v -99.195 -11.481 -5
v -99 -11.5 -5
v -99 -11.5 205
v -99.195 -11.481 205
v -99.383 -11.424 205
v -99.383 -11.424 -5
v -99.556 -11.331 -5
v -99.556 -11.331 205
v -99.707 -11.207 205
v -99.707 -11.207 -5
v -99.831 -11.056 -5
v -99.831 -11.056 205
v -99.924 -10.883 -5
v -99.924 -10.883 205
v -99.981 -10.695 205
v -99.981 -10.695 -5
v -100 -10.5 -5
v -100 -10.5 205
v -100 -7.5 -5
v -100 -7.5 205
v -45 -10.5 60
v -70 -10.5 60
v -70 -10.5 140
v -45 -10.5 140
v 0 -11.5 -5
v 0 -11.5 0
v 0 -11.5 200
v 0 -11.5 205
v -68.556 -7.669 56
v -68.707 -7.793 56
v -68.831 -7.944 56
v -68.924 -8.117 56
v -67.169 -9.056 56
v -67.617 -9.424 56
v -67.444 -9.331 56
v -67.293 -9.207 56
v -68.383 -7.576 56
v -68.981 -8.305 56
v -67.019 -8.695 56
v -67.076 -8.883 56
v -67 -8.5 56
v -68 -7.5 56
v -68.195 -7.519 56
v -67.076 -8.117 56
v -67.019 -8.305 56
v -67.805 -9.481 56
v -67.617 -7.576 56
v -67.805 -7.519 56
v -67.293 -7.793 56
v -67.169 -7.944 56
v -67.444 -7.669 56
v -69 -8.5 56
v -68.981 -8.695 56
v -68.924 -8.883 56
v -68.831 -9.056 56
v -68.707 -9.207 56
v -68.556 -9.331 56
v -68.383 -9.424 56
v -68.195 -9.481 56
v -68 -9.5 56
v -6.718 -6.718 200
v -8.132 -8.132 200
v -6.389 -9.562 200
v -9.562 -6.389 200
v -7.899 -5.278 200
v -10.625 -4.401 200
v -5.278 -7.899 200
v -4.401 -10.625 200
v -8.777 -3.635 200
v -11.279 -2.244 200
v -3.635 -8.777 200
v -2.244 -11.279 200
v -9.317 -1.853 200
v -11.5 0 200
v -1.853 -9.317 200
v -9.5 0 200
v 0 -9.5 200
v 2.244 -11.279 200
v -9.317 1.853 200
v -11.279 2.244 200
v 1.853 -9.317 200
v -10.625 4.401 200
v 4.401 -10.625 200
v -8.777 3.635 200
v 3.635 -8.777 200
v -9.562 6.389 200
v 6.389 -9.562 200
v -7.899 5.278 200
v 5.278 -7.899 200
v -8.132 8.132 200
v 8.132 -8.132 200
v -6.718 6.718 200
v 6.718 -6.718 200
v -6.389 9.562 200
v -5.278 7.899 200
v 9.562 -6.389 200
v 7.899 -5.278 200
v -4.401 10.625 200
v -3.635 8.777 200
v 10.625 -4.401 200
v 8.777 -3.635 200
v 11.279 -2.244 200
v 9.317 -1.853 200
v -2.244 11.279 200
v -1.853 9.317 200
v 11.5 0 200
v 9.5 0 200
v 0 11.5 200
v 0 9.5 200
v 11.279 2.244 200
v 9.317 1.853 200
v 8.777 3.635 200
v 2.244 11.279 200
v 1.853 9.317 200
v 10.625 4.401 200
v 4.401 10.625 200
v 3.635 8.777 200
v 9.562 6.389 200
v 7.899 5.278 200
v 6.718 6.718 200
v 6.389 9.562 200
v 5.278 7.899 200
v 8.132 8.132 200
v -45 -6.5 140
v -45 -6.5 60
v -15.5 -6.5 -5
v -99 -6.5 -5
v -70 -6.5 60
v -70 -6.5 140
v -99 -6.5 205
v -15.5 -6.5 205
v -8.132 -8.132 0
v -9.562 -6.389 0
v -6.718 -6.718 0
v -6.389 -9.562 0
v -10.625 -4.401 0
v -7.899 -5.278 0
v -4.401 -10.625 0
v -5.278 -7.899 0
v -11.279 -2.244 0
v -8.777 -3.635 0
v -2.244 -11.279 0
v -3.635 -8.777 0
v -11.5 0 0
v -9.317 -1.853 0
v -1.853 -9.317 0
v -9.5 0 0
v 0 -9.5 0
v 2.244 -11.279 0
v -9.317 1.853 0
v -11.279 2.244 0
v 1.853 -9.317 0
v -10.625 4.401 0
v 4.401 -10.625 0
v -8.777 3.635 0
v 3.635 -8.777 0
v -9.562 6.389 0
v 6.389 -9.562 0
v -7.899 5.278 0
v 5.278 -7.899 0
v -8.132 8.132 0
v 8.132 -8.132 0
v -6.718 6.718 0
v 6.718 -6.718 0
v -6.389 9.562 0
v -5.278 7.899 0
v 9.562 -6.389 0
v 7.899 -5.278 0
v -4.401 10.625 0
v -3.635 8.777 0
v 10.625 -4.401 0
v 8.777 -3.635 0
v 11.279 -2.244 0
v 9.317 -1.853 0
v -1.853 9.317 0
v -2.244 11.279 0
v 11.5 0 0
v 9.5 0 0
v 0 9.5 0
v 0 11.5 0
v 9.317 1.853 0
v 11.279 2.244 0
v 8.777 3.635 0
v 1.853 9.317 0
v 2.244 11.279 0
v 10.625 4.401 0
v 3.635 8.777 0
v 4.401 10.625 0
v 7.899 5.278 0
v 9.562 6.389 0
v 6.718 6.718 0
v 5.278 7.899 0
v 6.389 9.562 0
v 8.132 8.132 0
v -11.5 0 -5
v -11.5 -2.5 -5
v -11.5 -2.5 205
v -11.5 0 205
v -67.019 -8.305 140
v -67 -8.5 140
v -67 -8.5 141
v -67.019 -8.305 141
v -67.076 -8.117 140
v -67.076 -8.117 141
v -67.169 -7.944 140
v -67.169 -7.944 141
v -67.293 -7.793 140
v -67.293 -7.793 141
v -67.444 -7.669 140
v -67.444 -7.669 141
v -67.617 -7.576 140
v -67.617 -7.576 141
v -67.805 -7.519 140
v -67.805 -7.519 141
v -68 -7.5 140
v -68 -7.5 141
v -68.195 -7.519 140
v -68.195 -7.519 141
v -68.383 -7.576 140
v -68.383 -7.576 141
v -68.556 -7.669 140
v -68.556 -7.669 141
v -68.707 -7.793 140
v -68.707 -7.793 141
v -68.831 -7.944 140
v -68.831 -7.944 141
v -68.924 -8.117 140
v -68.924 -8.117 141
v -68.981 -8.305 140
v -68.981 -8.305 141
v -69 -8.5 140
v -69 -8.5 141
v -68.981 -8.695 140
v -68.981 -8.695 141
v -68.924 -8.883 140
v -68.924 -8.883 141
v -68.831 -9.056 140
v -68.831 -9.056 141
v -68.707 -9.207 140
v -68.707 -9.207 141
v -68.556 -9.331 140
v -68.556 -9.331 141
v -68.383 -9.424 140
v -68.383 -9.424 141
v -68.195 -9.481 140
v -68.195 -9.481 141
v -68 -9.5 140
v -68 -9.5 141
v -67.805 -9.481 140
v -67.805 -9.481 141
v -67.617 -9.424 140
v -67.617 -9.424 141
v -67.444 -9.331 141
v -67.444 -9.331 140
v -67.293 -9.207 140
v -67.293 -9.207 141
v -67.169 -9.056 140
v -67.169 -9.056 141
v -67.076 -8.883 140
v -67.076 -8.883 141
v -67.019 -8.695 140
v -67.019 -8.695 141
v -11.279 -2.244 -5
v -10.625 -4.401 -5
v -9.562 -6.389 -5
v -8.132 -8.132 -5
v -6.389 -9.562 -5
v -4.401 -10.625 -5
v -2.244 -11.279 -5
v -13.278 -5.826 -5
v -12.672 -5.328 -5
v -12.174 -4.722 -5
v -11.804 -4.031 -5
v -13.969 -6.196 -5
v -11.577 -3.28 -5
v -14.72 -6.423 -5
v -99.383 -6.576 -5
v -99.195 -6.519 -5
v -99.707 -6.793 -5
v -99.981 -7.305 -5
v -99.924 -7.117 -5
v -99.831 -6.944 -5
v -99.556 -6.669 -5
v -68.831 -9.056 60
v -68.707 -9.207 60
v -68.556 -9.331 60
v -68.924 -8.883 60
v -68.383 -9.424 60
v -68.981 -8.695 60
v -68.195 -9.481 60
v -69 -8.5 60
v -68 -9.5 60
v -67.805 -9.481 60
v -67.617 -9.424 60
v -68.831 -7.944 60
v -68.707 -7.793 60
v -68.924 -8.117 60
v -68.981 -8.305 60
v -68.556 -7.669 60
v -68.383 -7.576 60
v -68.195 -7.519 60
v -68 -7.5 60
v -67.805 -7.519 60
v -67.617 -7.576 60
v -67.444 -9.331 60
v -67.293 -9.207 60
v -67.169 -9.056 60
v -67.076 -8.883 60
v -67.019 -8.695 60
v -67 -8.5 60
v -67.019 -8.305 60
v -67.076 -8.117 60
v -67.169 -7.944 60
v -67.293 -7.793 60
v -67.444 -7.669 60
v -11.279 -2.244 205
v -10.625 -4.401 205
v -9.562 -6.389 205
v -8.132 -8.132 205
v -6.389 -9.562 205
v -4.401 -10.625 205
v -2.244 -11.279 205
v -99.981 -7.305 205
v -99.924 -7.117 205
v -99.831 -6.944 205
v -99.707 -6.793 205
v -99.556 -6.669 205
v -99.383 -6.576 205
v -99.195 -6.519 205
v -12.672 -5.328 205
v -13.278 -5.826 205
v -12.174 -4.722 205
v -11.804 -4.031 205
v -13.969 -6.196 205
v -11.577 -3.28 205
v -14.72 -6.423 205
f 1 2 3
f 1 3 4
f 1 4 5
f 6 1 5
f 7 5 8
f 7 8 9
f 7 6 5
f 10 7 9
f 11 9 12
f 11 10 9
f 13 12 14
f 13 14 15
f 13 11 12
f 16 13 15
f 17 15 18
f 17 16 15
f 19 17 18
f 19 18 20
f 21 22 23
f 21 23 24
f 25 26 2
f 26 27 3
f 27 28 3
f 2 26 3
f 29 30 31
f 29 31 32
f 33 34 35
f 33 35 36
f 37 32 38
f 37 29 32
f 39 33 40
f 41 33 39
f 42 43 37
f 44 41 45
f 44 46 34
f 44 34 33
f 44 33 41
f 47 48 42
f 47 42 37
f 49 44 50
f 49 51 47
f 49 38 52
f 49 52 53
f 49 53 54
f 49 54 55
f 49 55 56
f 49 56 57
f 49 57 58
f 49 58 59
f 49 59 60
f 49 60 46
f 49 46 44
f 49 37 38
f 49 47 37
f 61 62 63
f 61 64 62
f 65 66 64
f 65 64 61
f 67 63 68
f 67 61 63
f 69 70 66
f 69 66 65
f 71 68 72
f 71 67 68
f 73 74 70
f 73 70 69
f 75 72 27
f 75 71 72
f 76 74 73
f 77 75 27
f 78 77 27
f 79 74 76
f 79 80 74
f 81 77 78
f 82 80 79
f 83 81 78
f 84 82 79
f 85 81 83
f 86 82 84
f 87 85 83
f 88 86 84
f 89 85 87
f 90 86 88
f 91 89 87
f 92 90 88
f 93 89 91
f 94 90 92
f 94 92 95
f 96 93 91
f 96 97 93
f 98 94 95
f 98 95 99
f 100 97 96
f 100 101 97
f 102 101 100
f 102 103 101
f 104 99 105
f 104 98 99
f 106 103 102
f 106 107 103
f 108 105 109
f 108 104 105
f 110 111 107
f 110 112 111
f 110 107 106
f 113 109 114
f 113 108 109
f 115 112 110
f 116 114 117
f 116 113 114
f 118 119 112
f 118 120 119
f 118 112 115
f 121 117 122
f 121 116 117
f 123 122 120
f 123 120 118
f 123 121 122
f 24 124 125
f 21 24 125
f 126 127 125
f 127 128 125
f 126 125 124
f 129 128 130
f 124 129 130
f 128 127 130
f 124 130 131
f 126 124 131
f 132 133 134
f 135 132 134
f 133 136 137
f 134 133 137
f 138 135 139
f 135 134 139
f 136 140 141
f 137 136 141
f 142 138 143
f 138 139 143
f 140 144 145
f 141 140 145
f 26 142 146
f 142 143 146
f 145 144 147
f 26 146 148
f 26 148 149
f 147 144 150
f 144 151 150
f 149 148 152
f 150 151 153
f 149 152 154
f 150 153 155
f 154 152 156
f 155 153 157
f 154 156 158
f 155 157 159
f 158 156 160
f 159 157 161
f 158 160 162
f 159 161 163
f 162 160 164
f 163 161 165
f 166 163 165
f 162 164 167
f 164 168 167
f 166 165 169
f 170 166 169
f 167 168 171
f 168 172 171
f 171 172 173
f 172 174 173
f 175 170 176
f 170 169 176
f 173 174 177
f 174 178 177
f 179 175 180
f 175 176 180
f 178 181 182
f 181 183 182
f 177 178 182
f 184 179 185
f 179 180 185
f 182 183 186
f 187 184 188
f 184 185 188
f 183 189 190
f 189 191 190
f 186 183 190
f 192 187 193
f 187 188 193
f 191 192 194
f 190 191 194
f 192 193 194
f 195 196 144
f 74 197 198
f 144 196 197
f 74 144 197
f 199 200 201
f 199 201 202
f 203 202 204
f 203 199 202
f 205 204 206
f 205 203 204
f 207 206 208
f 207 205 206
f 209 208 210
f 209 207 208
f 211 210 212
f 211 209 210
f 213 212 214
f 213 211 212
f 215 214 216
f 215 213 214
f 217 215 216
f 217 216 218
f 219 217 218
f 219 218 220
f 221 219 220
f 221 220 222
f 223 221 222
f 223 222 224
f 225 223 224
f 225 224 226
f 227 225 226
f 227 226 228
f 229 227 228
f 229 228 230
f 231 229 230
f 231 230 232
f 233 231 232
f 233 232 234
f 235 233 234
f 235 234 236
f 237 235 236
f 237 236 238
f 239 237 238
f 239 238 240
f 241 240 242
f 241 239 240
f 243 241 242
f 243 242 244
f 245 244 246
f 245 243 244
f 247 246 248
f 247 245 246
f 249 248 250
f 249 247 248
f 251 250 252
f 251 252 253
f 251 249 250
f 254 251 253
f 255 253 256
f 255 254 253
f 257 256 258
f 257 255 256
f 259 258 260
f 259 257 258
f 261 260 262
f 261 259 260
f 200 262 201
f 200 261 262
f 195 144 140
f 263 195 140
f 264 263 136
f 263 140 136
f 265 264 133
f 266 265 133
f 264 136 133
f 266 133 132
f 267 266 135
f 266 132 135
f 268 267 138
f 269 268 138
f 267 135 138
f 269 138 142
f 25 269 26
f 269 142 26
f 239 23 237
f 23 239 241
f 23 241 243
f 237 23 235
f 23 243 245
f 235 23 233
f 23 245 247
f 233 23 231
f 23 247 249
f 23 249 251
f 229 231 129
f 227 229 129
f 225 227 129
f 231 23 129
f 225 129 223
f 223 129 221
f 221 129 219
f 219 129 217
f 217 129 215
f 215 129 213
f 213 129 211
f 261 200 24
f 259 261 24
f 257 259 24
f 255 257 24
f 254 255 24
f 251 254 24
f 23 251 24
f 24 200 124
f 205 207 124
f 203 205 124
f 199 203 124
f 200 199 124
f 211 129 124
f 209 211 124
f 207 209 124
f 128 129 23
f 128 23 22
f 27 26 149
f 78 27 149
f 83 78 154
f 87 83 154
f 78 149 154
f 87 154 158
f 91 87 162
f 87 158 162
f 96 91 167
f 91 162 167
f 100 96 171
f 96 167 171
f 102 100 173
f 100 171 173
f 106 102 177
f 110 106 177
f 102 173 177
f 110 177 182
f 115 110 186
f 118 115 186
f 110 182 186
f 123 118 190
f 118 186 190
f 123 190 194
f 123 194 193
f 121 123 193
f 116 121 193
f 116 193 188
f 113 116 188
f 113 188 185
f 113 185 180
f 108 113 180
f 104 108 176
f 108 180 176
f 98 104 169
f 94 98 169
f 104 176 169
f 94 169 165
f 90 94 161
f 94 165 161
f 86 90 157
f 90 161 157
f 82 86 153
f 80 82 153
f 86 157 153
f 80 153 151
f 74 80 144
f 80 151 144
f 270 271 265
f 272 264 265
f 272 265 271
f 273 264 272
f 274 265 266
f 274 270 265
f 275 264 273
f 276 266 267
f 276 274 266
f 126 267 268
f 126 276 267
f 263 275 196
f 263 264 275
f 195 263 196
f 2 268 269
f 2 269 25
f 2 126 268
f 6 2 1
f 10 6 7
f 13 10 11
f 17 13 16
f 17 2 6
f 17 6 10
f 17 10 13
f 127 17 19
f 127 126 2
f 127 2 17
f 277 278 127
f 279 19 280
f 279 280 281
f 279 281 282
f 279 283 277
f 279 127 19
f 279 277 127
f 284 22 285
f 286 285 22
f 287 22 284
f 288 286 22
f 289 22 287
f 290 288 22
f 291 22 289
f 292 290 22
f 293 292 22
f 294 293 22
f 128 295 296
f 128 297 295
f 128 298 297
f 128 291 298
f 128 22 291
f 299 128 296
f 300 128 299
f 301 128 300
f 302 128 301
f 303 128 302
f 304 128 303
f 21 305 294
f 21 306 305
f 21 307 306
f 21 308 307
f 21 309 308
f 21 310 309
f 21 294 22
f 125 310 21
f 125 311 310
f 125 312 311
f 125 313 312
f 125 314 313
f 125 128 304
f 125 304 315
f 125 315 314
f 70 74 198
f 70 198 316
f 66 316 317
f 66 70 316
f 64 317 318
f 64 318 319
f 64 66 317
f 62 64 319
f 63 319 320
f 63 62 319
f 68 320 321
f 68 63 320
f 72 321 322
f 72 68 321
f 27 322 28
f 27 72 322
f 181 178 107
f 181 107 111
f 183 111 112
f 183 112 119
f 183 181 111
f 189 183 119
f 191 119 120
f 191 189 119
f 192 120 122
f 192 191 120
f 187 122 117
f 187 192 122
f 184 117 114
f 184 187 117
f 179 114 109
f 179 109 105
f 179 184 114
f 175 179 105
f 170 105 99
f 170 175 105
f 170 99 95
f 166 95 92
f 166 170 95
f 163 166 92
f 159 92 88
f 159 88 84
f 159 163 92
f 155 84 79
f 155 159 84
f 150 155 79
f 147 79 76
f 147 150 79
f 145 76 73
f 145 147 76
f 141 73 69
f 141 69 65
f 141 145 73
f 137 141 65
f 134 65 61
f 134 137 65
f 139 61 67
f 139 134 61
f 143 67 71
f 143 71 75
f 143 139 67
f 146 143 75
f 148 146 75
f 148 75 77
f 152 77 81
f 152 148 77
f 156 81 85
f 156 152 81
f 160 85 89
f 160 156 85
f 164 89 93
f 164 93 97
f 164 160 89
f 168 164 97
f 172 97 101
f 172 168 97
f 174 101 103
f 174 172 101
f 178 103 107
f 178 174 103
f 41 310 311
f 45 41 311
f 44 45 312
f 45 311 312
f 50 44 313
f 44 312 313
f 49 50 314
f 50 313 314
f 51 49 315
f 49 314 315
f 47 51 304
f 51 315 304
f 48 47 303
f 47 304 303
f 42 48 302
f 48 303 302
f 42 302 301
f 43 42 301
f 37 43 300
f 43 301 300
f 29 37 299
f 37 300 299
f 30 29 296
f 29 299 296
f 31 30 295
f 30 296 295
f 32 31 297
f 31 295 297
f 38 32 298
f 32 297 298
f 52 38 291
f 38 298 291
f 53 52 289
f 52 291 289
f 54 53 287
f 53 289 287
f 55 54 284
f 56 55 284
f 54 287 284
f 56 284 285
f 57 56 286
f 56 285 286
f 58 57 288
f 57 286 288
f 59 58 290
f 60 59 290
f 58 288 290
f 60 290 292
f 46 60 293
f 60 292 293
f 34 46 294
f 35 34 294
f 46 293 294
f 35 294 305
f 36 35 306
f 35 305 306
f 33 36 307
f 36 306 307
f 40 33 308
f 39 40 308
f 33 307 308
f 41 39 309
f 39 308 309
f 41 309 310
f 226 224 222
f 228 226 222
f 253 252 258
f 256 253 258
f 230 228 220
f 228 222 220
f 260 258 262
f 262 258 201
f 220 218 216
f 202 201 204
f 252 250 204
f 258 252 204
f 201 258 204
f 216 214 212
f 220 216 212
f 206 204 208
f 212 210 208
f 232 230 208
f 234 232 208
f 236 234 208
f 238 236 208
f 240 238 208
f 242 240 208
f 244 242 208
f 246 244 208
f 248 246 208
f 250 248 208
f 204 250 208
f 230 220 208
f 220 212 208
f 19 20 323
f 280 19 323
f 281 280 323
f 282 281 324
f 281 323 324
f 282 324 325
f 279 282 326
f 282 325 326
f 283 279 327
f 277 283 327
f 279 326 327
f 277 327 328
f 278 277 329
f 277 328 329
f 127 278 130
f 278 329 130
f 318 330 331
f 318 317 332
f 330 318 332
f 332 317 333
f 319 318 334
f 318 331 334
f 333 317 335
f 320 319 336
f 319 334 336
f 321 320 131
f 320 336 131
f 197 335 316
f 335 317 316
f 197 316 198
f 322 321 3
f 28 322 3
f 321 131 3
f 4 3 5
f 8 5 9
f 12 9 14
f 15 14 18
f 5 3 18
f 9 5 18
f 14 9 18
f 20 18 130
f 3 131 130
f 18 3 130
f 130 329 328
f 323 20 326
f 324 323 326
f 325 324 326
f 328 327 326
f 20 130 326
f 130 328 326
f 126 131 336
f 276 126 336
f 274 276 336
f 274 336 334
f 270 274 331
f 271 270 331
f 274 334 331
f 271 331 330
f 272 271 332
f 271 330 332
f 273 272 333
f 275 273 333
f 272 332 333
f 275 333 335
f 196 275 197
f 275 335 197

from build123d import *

# Parameters (mm, degrees)
SKETCH_1_R               = 11.5
SKETCH_1_R_2             = 9.5
EXTRUDE_1_DEPTH          = 200
EXTRUDE_2_DEPTH          = 5
EXTRUDE_2_DEPTH_BACK     = 205
SKETCH_3_W               = 25
SKETCH_3_H               = 80
CUT_EXTRUDE_1_DEPTH      = 4
SKETCH_4_R               = 1
CUT_EXTRUDE_2_DEPTH      = 81
CUT_EXTRUDE_2_DEPTH_BACK = 4


with BuildPart() as part:
    # 草图1 → 凸台-拉伸1 (new body)
    with BuildSketch(Plane.XY):
        with BuildLine():
            ThreePointArc((0, -11.5), (-8.131727984, -8.131727984), (-11.5, 0))
            Line((-11.5, 0), (-11.5, -2.5))
            ThreePointArc((-11.5, -2.5), (-12.671572875, -5.328427125), (-15.5, -6.5))
            Line((-15.5, -6.5), (-99, -6.5))
            ThreePointArc((-99, -6.5), (-99.707106781, -6.792893219), (-100, -7.5))
            Line((-100, -7.5), (-100, -10.5))
            ThreePointArc((-100, -10.5), (-99.707106781, -11.207106781), (-99, -11.5))
            Line((-99, -11.5), (0, -11.5))
        make_face()
        Circle(SKETCH_1_R)
        Circle(SKETCH_1_R_2, mode=Mode.SUBTRACT)
    extrude(amount=EXTRUDE_1_DEPTH)

    # 草图2 → 凸台-拉伸2 (add, two sides)
    with BuildSketch(Plane(origin=(0, 0, 0), x_dir=(-1, 0, 0), z_dir=(0, 0, -1))) as extrude_2_sk:
        with BuildLine():
            Line((11.5, -2.5), (11.5, 0))
            ThreePointArc((11.5, 0), (8.131727984, -8.131727984), (0, -11.5))
            Line((0, -11.5), (99, -11.5))
            ThreePointArc((99, -11.5), (99.707106781, -11.207106781), (100, -10.5))
            Line((100, -10.5), (100, -7.5))
            ThreePointArc((100, -7.5), (99.707106781, -6.792893219), (99, -6.5))
            Line((99, -6.5), (15.5, -6.5))
            ThreePointArc((15.5, -6.5), (12.671572875, -5.328427125), (11.5, -2.5))
        make_face()
    extrude(amount=EXTRUDE_2_DEPTH)
    extrude(extrude_2_sk.sketch, amount=-EXTRUDE_2_DEPTH_BACK)

    # 草图3 → 切除-拉伸1 (cut)
    with BuildSketch(Plane(origin=(0, -6.5, 0), x_dir=(1, 0, 0), z_dir=(0, 1, 0))):
        with Locations((-57.5, -100)):
            Rectangle(SKETCH_3_W, SKETCH_3_H)
    extrude(amount=-CUT_EXTRUDE_1_DEPTH, mode=Mode.SUBTRACT)

    # 草图4 → 切除-拉伸2 (cut, two sides)
    with BuildSketch(Plane.XY.offset(60)) as cut_extrude_2_sk:
        with Locations((-68, -8.5)):
            Circle(SKETCH_4_R)
    extrude(amount=CUT_EXTRUDE_2_DEPTH, mode=Mode.SUBTRACT)
    extrude(cut_extrude_2_sk.sketch, amount=-CUT_EXTRUDE_2_DEPTH_BACK, mode=Mode.SUBTRACT)


solid = part.part
